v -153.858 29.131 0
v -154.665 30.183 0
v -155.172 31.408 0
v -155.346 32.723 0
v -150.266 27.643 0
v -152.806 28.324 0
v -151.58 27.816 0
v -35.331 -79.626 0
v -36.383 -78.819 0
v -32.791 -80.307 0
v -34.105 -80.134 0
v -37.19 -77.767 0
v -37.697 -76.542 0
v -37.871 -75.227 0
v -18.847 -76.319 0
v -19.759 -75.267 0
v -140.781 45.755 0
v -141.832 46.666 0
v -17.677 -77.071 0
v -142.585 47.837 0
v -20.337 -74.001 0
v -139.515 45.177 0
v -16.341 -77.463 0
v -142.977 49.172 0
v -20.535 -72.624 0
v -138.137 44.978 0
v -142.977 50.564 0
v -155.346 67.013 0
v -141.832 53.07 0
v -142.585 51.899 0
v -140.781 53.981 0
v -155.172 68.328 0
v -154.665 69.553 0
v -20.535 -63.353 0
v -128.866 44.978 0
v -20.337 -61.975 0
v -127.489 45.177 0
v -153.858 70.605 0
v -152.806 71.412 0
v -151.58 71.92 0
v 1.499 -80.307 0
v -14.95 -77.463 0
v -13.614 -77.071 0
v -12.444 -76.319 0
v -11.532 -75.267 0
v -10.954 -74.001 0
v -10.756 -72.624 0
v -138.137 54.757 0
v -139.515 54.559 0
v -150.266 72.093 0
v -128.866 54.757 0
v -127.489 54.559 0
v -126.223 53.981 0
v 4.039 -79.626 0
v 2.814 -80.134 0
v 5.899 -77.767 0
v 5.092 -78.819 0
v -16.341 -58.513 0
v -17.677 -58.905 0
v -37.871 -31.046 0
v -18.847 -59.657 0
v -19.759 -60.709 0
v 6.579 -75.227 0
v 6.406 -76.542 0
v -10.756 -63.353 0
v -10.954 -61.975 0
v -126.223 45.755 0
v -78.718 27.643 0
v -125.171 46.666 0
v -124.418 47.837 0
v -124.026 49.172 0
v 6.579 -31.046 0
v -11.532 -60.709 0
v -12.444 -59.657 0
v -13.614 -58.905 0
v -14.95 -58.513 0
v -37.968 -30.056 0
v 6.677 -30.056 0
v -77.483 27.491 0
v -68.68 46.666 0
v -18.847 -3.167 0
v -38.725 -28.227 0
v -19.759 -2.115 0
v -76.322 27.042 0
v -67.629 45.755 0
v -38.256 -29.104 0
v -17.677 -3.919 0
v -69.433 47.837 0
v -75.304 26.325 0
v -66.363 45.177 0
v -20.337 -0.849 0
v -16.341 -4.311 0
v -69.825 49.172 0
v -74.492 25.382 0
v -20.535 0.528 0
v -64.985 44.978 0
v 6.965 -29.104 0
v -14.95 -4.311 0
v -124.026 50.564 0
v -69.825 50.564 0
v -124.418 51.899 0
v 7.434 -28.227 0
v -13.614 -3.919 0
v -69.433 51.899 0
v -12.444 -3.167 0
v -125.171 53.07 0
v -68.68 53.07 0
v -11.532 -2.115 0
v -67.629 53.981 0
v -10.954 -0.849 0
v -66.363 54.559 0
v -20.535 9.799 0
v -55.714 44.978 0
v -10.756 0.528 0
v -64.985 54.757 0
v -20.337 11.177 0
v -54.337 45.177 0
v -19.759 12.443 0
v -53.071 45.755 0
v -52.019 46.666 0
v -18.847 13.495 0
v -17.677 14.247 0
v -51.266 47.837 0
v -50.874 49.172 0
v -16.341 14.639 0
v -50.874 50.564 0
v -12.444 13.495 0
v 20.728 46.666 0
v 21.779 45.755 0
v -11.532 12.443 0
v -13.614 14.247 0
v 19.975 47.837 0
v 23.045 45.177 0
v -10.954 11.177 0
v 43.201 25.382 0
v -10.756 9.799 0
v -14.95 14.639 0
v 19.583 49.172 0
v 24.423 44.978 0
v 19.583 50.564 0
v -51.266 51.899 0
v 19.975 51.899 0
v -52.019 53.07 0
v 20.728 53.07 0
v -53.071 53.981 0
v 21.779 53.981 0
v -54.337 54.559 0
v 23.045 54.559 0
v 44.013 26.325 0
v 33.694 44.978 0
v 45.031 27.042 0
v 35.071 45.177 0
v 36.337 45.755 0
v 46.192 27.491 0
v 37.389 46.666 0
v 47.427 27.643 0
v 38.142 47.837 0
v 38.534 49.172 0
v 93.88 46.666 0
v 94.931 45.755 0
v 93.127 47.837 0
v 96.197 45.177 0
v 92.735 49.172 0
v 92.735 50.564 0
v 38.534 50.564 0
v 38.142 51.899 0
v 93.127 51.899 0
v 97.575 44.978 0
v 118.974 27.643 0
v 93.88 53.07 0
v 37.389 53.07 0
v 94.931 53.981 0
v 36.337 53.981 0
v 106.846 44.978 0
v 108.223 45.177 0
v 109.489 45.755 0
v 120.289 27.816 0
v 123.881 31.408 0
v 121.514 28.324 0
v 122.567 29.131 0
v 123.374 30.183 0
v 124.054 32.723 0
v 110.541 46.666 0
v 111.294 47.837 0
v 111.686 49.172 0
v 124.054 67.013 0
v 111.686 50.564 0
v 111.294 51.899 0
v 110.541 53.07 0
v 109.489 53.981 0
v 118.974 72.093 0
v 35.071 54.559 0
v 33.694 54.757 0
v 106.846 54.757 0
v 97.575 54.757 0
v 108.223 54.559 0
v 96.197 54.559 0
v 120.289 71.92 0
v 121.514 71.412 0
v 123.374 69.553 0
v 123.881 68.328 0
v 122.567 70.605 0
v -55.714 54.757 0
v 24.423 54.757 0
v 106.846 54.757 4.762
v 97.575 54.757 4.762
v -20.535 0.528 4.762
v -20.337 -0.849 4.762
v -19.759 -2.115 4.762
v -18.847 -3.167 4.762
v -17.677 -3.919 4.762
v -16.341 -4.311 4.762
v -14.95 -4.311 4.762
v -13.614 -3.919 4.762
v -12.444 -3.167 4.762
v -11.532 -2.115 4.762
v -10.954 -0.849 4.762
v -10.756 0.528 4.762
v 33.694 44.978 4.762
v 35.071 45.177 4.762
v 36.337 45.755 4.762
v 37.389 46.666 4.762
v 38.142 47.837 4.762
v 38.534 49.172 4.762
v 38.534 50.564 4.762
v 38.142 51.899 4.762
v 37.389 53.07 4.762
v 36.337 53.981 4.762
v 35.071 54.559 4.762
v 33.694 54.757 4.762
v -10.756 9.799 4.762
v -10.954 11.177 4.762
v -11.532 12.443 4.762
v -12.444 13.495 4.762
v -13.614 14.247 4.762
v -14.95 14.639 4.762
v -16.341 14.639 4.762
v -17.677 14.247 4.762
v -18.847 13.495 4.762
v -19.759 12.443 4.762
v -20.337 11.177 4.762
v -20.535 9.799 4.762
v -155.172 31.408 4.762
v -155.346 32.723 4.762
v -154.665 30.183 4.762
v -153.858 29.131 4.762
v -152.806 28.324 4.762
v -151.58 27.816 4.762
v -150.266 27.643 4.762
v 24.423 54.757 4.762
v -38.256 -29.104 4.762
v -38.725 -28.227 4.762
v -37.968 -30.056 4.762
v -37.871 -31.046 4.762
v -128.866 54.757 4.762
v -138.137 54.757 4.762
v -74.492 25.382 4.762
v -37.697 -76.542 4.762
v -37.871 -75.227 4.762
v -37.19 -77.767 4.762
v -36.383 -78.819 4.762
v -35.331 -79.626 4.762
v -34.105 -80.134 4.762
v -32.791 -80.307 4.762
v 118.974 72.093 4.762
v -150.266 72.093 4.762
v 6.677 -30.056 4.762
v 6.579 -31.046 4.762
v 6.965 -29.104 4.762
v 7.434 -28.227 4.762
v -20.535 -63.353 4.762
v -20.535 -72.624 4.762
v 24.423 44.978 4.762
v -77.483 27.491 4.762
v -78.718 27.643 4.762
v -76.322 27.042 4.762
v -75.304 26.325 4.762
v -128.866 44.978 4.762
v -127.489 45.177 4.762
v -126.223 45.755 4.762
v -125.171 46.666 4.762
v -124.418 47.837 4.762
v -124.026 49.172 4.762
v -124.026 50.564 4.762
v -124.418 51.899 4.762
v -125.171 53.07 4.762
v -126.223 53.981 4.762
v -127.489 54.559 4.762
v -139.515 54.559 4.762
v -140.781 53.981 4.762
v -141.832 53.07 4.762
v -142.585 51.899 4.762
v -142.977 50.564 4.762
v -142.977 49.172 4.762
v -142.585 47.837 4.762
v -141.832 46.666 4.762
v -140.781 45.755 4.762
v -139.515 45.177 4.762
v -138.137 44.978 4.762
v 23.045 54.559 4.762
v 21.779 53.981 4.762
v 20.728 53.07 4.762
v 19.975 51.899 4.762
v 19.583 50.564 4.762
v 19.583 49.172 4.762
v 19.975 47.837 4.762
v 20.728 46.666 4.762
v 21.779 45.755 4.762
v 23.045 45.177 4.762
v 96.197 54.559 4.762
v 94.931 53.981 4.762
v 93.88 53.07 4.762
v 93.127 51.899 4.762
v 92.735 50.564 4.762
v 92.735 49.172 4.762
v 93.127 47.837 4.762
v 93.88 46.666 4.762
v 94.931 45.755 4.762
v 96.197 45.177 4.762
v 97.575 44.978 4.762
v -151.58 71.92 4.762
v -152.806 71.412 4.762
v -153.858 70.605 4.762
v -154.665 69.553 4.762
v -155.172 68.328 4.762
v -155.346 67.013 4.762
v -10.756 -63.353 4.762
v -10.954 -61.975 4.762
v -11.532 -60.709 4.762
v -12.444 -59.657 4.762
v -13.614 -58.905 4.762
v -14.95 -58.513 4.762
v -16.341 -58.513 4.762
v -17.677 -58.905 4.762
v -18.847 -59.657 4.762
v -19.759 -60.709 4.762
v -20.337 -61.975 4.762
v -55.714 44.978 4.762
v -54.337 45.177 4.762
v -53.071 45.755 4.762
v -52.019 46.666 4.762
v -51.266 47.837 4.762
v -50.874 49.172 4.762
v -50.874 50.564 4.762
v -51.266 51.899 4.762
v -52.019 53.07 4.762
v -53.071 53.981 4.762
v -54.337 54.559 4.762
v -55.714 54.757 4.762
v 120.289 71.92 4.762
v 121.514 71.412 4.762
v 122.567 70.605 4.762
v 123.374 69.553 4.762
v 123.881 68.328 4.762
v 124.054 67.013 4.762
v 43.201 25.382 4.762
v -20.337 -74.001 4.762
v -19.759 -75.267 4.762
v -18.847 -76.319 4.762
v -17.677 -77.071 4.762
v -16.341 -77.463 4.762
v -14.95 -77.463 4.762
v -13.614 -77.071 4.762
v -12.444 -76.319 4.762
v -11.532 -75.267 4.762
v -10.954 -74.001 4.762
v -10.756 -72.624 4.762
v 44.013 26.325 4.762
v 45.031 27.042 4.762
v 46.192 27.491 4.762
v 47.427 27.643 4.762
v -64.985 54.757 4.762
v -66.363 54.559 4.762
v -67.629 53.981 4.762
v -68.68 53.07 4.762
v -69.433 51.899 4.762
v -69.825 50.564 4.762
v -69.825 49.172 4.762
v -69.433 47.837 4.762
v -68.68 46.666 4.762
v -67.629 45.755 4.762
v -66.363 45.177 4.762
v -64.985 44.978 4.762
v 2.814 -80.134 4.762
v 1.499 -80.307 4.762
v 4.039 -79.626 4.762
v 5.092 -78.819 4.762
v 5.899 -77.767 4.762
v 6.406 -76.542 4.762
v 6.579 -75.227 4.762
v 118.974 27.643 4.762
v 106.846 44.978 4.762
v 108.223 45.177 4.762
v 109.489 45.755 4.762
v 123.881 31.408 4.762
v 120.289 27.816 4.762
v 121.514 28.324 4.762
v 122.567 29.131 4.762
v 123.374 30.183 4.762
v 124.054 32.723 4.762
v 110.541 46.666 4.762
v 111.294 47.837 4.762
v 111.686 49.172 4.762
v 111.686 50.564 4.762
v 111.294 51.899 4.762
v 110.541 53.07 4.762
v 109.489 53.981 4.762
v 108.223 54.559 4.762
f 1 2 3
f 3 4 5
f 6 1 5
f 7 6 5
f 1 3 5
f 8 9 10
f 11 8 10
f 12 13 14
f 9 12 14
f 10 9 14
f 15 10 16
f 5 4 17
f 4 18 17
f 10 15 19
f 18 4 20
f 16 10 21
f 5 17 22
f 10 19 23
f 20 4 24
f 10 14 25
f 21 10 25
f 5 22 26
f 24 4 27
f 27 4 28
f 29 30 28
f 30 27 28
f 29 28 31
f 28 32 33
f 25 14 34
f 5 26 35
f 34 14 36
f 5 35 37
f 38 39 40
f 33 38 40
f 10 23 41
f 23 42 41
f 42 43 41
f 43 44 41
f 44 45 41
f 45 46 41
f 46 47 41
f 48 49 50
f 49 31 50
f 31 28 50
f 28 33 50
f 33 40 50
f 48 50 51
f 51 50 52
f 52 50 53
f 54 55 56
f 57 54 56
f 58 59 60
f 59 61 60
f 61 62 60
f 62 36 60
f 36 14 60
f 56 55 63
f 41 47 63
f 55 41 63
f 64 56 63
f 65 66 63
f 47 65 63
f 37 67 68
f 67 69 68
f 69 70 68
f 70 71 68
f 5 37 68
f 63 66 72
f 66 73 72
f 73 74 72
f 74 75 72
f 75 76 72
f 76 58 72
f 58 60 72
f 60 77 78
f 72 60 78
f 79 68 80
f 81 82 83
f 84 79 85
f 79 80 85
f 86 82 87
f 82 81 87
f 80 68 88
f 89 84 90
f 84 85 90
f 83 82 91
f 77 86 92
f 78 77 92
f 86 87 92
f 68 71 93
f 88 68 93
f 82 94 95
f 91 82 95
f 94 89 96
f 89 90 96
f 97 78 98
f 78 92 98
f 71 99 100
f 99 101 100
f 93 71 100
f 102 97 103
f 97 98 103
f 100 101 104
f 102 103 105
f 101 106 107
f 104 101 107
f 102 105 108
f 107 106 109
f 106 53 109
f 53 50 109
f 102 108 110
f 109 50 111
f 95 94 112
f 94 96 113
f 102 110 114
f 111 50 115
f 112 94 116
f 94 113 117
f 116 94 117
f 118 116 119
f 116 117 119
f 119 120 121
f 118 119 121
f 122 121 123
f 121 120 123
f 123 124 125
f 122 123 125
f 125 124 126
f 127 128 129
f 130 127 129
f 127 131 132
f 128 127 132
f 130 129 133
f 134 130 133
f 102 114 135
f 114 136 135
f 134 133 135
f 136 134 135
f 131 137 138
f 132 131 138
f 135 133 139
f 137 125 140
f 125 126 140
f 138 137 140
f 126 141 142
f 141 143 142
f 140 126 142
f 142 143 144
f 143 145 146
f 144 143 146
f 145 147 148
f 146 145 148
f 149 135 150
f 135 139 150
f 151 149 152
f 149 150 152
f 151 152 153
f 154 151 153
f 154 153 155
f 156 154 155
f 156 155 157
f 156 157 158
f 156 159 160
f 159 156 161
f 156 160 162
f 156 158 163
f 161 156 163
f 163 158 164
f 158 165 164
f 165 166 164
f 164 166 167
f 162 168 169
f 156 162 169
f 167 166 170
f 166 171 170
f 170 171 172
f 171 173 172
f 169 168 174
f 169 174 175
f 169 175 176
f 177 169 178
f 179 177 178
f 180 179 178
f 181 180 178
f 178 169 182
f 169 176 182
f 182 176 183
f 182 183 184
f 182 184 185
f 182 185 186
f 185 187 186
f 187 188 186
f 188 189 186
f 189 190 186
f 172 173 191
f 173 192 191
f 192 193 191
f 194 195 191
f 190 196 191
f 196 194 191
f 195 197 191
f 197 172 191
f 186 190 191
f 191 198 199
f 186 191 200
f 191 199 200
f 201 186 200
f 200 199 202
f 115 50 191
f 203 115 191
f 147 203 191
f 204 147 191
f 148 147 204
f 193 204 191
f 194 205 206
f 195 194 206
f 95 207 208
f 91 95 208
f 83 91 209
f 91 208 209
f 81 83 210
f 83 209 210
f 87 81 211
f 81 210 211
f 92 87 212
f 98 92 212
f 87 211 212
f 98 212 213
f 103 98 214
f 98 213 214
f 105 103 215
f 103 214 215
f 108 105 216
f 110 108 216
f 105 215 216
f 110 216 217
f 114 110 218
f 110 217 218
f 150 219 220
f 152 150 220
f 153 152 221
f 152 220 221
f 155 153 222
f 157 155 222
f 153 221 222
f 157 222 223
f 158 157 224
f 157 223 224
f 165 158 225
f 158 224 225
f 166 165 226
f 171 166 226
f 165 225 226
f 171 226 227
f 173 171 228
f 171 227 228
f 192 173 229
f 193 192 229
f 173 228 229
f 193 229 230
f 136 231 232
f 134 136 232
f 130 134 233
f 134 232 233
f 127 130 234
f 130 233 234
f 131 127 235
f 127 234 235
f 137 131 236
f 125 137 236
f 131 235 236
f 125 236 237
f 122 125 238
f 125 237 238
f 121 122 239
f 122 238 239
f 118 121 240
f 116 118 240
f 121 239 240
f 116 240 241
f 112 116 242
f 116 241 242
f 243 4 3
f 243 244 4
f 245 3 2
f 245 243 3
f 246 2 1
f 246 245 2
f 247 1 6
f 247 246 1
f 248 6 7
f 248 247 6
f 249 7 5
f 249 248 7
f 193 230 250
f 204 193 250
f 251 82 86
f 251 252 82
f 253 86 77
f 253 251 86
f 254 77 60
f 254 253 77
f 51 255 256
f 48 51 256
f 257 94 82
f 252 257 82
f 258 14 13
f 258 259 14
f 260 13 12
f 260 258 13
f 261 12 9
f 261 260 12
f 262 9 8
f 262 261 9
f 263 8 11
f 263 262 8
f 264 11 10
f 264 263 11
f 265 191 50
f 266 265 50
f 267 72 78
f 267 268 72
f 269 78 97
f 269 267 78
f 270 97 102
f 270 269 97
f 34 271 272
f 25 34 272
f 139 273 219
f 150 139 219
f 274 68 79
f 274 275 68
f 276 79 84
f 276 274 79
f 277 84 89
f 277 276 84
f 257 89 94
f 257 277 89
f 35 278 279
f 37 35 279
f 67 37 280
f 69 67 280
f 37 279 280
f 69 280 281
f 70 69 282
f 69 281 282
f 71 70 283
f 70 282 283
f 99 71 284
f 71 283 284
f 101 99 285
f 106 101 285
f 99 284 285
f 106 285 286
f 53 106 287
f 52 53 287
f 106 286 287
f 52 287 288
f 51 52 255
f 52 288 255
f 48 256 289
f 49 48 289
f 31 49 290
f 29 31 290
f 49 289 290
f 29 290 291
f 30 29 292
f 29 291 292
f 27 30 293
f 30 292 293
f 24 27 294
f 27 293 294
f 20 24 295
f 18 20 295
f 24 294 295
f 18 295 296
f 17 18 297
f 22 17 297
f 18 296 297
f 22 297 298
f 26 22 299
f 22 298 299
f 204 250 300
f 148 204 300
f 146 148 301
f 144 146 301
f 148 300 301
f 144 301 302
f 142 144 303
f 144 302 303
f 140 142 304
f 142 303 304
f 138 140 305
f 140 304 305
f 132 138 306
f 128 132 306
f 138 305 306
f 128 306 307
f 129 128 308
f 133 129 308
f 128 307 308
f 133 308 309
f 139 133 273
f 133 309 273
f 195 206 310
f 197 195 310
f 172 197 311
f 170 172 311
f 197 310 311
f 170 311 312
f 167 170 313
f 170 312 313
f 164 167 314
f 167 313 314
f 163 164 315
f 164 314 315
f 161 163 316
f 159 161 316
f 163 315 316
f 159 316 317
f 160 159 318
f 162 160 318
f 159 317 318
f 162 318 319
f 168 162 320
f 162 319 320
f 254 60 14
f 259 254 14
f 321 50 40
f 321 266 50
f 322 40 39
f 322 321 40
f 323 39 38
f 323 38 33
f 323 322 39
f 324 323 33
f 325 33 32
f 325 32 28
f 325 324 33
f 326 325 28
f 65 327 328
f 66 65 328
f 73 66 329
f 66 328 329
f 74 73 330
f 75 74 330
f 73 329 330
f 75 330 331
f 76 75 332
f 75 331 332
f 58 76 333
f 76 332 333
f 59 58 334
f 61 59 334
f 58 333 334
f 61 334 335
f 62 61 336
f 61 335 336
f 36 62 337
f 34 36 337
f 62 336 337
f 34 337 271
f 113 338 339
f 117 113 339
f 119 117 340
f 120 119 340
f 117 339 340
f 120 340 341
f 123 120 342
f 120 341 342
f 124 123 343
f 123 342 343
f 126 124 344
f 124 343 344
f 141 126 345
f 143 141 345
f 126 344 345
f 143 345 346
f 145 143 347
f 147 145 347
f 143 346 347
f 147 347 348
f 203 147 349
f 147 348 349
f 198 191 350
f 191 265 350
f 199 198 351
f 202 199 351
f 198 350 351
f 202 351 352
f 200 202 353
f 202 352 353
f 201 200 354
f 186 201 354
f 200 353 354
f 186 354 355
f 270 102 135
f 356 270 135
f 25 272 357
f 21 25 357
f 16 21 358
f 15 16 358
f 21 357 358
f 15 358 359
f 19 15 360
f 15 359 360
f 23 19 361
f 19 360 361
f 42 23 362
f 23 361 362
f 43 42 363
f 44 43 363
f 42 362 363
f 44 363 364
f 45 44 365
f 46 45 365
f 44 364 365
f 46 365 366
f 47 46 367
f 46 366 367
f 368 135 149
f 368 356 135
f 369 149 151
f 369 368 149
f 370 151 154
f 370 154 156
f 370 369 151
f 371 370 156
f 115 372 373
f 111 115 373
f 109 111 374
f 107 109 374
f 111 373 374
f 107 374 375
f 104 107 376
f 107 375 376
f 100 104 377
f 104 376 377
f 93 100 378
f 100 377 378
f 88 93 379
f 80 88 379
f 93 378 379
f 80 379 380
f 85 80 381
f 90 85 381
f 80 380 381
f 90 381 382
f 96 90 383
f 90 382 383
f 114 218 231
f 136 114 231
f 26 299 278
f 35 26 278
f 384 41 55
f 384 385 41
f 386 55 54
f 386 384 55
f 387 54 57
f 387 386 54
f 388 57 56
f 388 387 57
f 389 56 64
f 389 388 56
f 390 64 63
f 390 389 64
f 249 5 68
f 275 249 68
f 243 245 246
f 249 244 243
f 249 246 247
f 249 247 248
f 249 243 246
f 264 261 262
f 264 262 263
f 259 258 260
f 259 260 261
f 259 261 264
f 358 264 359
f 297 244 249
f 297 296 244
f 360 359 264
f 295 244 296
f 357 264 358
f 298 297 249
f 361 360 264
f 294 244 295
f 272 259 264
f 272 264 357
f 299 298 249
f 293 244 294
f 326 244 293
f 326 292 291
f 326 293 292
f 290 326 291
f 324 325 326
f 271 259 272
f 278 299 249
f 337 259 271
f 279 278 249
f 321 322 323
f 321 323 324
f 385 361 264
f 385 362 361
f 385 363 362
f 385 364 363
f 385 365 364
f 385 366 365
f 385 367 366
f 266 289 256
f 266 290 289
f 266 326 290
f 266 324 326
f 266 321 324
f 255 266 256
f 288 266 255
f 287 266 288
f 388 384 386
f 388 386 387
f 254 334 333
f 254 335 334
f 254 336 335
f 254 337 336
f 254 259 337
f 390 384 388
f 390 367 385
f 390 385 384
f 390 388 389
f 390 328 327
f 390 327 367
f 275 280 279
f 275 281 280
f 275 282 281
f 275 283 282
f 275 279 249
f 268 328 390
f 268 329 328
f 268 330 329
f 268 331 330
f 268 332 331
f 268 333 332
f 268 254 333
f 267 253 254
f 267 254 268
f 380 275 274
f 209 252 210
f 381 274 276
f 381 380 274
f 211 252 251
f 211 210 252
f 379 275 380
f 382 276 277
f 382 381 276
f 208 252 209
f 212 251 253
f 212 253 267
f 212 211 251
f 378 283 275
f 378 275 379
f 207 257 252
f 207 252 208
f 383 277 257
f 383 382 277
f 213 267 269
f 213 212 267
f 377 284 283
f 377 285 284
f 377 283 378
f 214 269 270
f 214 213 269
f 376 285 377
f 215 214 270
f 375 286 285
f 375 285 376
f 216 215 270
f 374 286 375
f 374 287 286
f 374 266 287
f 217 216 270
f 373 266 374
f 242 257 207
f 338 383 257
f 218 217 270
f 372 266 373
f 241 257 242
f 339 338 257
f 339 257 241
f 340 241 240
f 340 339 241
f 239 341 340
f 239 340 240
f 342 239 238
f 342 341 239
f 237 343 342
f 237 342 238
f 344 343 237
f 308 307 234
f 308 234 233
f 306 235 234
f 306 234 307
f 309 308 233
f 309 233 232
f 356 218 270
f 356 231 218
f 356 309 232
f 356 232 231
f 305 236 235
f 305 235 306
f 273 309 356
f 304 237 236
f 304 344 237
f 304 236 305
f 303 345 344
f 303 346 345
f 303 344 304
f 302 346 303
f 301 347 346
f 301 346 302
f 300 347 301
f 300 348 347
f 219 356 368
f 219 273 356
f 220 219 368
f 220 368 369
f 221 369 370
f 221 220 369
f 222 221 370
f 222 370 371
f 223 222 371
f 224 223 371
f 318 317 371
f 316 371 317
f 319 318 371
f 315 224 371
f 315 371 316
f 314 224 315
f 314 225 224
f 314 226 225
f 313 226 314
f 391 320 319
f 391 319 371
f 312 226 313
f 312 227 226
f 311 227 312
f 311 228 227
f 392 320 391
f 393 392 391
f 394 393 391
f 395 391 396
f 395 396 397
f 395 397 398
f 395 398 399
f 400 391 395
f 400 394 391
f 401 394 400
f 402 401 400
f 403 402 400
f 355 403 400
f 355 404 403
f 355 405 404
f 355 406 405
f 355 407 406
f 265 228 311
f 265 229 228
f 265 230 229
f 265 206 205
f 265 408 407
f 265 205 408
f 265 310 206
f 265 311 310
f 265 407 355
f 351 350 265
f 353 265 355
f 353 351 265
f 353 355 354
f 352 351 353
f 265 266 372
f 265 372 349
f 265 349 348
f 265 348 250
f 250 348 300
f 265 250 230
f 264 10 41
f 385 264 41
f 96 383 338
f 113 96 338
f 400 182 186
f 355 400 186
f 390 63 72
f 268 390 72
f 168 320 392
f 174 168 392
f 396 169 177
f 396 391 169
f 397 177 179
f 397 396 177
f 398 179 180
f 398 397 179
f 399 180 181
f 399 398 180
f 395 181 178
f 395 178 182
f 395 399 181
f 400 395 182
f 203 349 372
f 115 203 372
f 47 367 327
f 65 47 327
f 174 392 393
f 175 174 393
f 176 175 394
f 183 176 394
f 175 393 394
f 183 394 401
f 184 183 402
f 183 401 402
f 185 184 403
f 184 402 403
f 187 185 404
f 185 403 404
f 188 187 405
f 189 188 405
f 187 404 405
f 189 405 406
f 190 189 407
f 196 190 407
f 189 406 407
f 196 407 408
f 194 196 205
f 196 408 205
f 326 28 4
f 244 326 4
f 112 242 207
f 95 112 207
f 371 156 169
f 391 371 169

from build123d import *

# Parameters (mm, degrees)
F1_DEPTH = 4.7625
F2_R     = 5.08
F4_DEPTH = 4.7635


# Not quite as in the source:
# - a length typed as a fraction of an inch, garbled in the dataset ("3 / 203.2 mm" for 3/8 in), is restored


with BuildPart() as f1:
    # F0 (on Top) → F1 (new body)
    with BuildSketch(Plane.XY):
        Polygon((124.0544550598, 72.092982788), (-155.3455449402, 72.092982788), (-155.3455449402, 27.642982788), (-76.0003953454, 27.642982788), (-37.8705449402, -29.507017212), (-37.8705449402, -80.307017212), (6.5794550598, -80.307017212), (6.5794550598, -29.507017212), (44.7093054649, 27.642982788), (124.0544550598, 27.642982788), align=None)
    extrude(amount=F1_DEPTH)

    # F2
    f2_edges = [f1.edges().sort_by_distance(p)[0] for p in [
        (-155.345545, 27.642983, 2.38125),
        (-155.345545, 72.092983, 2.38125),
        (-37.870545, -80.307017, 2.38125),
        (6.579455, -80.307017, 2.38125),
        (-76.000395, 27.642983, 2.38125),
        (-37.870545, -29.507017, 2.38125),
        (6.579455, -29.507017, 2.38125),
        (44.709305, 27.642983, 2.38125),
        (124.054455, 27.642983, 2.38125),
        (124.054455, 72.092983, 2.38125),
    ]]
    fillet(f2_edges, radius=F2_R)

    # F3 (on face) → F4 (cut, through all)
    with BuildSketch(Plane.XY.offset(4.7625)):
        with BuildLine():
            Line((106.8459550598, 54.757482788), (97.5749550598, 54.757482788))
            ThreePointArc((97.5749550598, 54.757482788), (92.6854550598, 49.867982788), (97.5749550598, 44.978482788))
            Line((97.5749550598, 44.978482788), (106.8459550598, 44.978482788))
            ThreePointArc((106.8459550598, 44.978482788), (111.7354550598, 49.867982788), (106.8459550598, 54.757482788))
        make_face()
        with BuildLine():
            Line((33.6939550598, 54.757482788), (24.4229550598, 54.757482788))
            ThreePointArc((24.4229550598, 54.757482788), (19.5334550598, 49.867982788), (24.4229550598, 44.978482788))
            Line((24.4229550598, 44.978482788), (33.6939550598, 44.978482788))
            ThreePointArc((33.6939550598, 44.978482788), (38.5834550598, 49.867982788), (33.6939550598, 54.757482788))
        make_face()
        with BuildLine():
            ThreePointArc((-10.7560449402, -63.352517212), (-15.6455449402, -58.463017212), (-20.5350449402, -63.352517212))
            Line((-20.5350449402, -63.352517212), (-20.5350449402, -72.623517212))
            ThreePointArc((-20.5350449402, -72.623517212), (-15.6455449402, -77.513017212), (-10.7560449402, -72.623517212))
            Line((-10.7560449402, -72.623517212), (-10.7560449402, -63.352517212))
        make_face()
        with BuildLine():
            Line((-10.7560449402, 0.528482788), (-10.7560449402, 9.799482788))
            ThreePointArc((-10.7560449402, 9.799482788), (-15.6455449402, 14.688982788), (-20.5350449402, 9.799482788))
            Line((-20.5350449402, 9.799482788), (-20.5350449402, 0.528482788))
            ThreePointArc((-20.5350449402, 0.528482788), (-15.6455449402, -4.361017212), (-10.7560449402, 0.528482788))
        make_face()
        with BuildLine():
            Line((-128.8660449402, 54.757482788), (-138.1370449402, 54.757482788))
            ThreePointArc((-138.1370449402, 54.757482788), (-143.0265449402, 49.867982788), (-138.1370449402, 44.978482788))
            Line((-138.1370449402, 44.978482788), (-128.8660449402, 44.978482788))
            ThreePointArc((-128.8660449402, 44.978482788), (-123.9765449402, 49.867982788), (-128.8660449402, 54.757482788))
        make_face()
        with BuildLine():
            Line((-55.7140449402, 54.757482788), (-64.9850449402, 54.757482788))
            ThreePointArc((-64.9850449402, 54.757482788), (-69.8745449402, 49.867982788), (-64.9850449402, 44.978482788))
            Line((-64.9850449402, 44.978482788), (-55.7140449402, 44.978482788))
            ThreePointArc((-55.7140449402, 44.978482788), (-50.8245449402, 49.867982788), (-55.7140449402, 54.757482788))
        make_face()
    extrude(amount=-F4_DEPTH, mode=Mode.SUBTRACT)


solid = f1.part
